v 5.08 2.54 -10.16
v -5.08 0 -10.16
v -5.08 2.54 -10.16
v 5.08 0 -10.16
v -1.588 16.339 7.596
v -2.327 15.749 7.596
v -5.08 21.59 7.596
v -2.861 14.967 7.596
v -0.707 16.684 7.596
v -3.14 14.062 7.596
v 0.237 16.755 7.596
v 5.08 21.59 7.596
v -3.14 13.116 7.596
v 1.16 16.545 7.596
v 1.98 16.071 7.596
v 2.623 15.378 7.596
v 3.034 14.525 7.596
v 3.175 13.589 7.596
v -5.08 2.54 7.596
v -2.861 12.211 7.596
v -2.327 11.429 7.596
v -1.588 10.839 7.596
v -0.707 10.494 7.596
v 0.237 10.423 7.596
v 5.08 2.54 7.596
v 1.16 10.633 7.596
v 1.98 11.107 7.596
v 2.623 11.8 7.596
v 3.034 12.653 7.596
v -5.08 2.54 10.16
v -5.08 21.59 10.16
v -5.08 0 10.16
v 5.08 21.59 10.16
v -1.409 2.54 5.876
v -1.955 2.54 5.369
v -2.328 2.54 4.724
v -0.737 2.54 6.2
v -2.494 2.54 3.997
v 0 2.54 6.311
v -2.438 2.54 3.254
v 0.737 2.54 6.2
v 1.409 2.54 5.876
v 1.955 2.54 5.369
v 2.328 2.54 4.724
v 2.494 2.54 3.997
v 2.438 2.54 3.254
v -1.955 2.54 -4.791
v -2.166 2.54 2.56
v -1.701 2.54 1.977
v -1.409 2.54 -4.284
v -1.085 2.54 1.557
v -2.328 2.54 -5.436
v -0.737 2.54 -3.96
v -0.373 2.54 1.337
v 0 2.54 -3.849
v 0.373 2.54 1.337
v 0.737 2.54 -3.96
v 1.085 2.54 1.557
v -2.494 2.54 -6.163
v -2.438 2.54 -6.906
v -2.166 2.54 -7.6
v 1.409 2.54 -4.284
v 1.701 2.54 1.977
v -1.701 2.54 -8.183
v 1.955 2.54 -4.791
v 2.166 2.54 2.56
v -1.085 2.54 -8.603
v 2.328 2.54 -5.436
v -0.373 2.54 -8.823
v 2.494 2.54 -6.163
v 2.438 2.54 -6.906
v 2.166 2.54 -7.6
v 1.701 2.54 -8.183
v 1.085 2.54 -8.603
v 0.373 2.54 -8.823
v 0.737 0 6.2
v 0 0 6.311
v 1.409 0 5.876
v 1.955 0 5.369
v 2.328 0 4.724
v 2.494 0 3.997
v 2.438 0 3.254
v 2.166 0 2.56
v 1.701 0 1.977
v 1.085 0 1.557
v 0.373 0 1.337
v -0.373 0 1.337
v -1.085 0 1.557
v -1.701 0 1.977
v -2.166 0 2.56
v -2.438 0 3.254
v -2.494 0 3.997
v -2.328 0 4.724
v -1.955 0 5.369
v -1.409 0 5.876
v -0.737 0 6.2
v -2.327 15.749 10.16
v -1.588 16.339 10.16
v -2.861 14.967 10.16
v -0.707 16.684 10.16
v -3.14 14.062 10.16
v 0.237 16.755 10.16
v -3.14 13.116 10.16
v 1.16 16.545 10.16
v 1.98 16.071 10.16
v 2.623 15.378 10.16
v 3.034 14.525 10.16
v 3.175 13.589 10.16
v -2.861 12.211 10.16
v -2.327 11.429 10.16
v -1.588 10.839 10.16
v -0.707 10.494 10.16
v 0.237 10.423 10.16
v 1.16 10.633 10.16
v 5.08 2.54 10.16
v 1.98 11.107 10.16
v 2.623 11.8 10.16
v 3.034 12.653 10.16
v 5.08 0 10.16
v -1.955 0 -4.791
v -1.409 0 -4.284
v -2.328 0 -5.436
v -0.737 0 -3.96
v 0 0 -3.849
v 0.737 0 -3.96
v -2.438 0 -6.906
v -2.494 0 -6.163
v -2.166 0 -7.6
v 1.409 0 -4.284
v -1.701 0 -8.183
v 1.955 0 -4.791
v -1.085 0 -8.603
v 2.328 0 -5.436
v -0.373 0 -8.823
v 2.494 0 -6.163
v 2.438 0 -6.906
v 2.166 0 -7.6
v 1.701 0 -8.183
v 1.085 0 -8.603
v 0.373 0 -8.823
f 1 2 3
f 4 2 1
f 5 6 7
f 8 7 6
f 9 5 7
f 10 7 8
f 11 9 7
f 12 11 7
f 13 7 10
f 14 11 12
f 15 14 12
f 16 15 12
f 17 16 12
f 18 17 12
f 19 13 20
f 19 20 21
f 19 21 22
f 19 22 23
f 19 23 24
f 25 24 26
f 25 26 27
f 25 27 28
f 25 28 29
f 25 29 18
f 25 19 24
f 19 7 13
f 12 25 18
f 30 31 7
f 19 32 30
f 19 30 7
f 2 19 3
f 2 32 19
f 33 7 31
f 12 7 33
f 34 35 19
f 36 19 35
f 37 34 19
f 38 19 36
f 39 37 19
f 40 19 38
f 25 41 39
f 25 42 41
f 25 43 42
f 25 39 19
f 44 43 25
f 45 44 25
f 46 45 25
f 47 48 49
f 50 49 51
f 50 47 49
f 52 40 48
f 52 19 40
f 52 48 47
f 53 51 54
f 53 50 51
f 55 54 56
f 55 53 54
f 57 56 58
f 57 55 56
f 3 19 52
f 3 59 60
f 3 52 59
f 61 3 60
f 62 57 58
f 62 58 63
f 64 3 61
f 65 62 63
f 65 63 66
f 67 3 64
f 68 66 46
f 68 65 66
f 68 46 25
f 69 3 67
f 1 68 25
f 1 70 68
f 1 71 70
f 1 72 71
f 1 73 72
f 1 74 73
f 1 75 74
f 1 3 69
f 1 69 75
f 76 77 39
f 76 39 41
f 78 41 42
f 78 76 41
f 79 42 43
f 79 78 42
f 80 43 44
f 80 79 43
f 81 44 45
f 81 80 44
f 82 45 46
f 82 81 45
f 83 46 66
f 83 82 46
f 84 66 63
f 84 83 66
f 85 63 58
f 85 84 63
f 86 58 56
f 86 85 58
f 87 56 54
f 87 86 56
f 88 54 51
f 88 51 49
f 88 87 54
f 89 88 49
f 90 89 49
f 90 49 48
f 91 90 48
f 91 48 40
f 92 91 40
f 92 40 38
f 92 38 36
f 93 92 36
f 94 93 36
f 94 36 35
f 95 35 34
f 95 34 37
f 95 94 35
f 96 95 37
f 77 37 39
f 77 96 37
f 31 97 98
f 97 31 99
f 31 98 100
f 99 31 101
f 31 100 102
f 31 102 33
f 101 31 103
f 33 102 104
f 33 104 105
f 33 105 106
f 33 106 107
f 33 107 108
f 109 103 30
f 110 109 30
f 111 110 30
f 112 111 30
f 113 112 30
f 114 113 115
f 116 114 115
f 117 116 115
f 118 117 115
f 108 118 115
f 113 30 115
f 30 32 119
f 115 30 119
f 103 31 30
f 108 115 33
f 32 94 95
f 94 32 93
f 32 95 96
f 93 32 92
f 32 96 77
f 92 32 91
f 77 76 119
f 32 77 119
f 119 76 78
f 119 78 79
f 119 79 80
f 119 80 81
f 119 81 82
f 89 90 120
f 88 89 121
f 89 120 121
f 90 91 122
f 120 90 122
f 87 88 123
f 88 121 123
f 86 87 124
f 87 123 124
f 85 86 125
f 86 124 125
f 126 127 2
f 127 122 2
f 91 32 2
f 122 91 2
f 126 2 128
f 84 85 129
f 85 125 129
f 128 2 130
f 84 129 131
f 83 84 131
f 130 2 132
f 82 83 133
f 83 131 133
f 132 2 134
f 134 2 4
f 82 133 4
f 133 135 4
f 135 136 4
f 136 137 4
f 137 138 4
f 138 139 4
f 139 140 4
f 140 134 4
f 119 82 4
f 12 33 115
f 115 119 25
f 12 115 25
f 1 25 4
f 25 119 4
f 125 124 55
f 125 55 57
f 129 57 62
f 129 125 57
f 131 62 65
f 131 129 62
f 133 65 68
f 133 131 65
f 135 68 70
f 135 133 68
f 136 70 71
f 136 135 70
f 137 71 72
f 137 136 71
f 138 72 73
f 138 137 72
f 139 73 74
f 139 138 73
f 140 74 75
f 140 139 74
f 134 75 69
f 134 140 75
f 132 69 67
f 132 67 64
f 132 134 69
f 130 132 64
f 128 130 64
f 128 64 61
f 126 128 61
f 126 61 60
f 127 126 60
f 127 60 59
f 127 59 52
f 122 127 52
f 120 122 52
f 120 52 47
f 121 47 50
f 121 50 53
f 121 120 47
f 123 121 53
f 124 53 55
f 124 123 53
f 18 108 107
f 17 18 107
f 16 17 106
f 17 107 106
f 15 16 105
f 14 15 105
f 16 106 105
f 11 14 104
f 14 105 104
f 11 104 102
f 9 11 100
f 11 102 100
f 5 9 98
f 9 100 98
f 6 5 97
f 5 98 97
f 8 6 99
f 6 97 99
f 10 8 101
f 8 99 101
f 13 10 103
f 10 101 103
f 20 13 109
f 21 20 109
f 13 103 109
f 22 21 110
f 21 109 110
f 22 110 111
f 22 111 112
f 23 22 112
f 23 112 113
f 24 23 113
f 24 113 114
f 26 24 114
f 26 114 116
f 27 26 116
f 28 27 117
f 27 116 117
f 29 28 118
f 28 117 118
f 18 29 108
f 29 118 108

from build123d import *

# Parameters (mm, degrees)
SKETCH1_W           = 10.16
SKETCH1_H           = 20.32
SKETCH1_R           = 2.50063
BOSS_EXTRUDE1_DEPTH = 2.54
SKETCH2_W           = 10.16
SKETCH2_H           = 2.564193751
BOSS_EXTRUDE2_DEPTH = 19.05
SKETCH3_R           = 3.175
CUT_EXTRUDE1_DEPTH  = 2.564193751


with BuildPart() as part:
    # Sketch1 → Boss-Extrude1 (new body)
    with BuildSketch(Plane(origin=(0, 0, 0), x_dir=(1, 0, 0), z_dir=(0, 1, 0))):
        Rectangle(SKETCH1_W, SKETCH1_H)
        with Locations(Location((0, 6.35, 0), (0, 0, 270))):
            Circle(SKETCH1_R, mode=Mode.SUBTRACT)
        with Locations(Location((0, -3.81, 0), (0, 0, 270))):
            Circle(SKETCH1_R, mode=Mode.SUBTRACT)
    extrude(amount=BOSS_EXTRUDE1_DEPTH)

    # Sketch2 → Boss-Extrude2 (add)
    with BuildSketch(Plane(origin=(0, 2.54, 0), x_dir=(1, 0, 0), z_dir=(0, 1, 0))):
        with Locations((0, -8.877903125)):
            Rectangle(SKETCH2_W, SKETCH2_H)
    extrude(amount=BOSS_EXTRUDE2_DEPTH)

    # Sketch3 → Cut-Extrude1 (cut)
    with BuildSketch(Plane.XY.offset(10.16)):
        with Locations((0, 13.589)):
            Circle(SKETCH3_R)
    extrude(amount=-CUT_EXTRUDE1_DEPTH, mode=Mode.SUBTRACT)


solid = part.part
